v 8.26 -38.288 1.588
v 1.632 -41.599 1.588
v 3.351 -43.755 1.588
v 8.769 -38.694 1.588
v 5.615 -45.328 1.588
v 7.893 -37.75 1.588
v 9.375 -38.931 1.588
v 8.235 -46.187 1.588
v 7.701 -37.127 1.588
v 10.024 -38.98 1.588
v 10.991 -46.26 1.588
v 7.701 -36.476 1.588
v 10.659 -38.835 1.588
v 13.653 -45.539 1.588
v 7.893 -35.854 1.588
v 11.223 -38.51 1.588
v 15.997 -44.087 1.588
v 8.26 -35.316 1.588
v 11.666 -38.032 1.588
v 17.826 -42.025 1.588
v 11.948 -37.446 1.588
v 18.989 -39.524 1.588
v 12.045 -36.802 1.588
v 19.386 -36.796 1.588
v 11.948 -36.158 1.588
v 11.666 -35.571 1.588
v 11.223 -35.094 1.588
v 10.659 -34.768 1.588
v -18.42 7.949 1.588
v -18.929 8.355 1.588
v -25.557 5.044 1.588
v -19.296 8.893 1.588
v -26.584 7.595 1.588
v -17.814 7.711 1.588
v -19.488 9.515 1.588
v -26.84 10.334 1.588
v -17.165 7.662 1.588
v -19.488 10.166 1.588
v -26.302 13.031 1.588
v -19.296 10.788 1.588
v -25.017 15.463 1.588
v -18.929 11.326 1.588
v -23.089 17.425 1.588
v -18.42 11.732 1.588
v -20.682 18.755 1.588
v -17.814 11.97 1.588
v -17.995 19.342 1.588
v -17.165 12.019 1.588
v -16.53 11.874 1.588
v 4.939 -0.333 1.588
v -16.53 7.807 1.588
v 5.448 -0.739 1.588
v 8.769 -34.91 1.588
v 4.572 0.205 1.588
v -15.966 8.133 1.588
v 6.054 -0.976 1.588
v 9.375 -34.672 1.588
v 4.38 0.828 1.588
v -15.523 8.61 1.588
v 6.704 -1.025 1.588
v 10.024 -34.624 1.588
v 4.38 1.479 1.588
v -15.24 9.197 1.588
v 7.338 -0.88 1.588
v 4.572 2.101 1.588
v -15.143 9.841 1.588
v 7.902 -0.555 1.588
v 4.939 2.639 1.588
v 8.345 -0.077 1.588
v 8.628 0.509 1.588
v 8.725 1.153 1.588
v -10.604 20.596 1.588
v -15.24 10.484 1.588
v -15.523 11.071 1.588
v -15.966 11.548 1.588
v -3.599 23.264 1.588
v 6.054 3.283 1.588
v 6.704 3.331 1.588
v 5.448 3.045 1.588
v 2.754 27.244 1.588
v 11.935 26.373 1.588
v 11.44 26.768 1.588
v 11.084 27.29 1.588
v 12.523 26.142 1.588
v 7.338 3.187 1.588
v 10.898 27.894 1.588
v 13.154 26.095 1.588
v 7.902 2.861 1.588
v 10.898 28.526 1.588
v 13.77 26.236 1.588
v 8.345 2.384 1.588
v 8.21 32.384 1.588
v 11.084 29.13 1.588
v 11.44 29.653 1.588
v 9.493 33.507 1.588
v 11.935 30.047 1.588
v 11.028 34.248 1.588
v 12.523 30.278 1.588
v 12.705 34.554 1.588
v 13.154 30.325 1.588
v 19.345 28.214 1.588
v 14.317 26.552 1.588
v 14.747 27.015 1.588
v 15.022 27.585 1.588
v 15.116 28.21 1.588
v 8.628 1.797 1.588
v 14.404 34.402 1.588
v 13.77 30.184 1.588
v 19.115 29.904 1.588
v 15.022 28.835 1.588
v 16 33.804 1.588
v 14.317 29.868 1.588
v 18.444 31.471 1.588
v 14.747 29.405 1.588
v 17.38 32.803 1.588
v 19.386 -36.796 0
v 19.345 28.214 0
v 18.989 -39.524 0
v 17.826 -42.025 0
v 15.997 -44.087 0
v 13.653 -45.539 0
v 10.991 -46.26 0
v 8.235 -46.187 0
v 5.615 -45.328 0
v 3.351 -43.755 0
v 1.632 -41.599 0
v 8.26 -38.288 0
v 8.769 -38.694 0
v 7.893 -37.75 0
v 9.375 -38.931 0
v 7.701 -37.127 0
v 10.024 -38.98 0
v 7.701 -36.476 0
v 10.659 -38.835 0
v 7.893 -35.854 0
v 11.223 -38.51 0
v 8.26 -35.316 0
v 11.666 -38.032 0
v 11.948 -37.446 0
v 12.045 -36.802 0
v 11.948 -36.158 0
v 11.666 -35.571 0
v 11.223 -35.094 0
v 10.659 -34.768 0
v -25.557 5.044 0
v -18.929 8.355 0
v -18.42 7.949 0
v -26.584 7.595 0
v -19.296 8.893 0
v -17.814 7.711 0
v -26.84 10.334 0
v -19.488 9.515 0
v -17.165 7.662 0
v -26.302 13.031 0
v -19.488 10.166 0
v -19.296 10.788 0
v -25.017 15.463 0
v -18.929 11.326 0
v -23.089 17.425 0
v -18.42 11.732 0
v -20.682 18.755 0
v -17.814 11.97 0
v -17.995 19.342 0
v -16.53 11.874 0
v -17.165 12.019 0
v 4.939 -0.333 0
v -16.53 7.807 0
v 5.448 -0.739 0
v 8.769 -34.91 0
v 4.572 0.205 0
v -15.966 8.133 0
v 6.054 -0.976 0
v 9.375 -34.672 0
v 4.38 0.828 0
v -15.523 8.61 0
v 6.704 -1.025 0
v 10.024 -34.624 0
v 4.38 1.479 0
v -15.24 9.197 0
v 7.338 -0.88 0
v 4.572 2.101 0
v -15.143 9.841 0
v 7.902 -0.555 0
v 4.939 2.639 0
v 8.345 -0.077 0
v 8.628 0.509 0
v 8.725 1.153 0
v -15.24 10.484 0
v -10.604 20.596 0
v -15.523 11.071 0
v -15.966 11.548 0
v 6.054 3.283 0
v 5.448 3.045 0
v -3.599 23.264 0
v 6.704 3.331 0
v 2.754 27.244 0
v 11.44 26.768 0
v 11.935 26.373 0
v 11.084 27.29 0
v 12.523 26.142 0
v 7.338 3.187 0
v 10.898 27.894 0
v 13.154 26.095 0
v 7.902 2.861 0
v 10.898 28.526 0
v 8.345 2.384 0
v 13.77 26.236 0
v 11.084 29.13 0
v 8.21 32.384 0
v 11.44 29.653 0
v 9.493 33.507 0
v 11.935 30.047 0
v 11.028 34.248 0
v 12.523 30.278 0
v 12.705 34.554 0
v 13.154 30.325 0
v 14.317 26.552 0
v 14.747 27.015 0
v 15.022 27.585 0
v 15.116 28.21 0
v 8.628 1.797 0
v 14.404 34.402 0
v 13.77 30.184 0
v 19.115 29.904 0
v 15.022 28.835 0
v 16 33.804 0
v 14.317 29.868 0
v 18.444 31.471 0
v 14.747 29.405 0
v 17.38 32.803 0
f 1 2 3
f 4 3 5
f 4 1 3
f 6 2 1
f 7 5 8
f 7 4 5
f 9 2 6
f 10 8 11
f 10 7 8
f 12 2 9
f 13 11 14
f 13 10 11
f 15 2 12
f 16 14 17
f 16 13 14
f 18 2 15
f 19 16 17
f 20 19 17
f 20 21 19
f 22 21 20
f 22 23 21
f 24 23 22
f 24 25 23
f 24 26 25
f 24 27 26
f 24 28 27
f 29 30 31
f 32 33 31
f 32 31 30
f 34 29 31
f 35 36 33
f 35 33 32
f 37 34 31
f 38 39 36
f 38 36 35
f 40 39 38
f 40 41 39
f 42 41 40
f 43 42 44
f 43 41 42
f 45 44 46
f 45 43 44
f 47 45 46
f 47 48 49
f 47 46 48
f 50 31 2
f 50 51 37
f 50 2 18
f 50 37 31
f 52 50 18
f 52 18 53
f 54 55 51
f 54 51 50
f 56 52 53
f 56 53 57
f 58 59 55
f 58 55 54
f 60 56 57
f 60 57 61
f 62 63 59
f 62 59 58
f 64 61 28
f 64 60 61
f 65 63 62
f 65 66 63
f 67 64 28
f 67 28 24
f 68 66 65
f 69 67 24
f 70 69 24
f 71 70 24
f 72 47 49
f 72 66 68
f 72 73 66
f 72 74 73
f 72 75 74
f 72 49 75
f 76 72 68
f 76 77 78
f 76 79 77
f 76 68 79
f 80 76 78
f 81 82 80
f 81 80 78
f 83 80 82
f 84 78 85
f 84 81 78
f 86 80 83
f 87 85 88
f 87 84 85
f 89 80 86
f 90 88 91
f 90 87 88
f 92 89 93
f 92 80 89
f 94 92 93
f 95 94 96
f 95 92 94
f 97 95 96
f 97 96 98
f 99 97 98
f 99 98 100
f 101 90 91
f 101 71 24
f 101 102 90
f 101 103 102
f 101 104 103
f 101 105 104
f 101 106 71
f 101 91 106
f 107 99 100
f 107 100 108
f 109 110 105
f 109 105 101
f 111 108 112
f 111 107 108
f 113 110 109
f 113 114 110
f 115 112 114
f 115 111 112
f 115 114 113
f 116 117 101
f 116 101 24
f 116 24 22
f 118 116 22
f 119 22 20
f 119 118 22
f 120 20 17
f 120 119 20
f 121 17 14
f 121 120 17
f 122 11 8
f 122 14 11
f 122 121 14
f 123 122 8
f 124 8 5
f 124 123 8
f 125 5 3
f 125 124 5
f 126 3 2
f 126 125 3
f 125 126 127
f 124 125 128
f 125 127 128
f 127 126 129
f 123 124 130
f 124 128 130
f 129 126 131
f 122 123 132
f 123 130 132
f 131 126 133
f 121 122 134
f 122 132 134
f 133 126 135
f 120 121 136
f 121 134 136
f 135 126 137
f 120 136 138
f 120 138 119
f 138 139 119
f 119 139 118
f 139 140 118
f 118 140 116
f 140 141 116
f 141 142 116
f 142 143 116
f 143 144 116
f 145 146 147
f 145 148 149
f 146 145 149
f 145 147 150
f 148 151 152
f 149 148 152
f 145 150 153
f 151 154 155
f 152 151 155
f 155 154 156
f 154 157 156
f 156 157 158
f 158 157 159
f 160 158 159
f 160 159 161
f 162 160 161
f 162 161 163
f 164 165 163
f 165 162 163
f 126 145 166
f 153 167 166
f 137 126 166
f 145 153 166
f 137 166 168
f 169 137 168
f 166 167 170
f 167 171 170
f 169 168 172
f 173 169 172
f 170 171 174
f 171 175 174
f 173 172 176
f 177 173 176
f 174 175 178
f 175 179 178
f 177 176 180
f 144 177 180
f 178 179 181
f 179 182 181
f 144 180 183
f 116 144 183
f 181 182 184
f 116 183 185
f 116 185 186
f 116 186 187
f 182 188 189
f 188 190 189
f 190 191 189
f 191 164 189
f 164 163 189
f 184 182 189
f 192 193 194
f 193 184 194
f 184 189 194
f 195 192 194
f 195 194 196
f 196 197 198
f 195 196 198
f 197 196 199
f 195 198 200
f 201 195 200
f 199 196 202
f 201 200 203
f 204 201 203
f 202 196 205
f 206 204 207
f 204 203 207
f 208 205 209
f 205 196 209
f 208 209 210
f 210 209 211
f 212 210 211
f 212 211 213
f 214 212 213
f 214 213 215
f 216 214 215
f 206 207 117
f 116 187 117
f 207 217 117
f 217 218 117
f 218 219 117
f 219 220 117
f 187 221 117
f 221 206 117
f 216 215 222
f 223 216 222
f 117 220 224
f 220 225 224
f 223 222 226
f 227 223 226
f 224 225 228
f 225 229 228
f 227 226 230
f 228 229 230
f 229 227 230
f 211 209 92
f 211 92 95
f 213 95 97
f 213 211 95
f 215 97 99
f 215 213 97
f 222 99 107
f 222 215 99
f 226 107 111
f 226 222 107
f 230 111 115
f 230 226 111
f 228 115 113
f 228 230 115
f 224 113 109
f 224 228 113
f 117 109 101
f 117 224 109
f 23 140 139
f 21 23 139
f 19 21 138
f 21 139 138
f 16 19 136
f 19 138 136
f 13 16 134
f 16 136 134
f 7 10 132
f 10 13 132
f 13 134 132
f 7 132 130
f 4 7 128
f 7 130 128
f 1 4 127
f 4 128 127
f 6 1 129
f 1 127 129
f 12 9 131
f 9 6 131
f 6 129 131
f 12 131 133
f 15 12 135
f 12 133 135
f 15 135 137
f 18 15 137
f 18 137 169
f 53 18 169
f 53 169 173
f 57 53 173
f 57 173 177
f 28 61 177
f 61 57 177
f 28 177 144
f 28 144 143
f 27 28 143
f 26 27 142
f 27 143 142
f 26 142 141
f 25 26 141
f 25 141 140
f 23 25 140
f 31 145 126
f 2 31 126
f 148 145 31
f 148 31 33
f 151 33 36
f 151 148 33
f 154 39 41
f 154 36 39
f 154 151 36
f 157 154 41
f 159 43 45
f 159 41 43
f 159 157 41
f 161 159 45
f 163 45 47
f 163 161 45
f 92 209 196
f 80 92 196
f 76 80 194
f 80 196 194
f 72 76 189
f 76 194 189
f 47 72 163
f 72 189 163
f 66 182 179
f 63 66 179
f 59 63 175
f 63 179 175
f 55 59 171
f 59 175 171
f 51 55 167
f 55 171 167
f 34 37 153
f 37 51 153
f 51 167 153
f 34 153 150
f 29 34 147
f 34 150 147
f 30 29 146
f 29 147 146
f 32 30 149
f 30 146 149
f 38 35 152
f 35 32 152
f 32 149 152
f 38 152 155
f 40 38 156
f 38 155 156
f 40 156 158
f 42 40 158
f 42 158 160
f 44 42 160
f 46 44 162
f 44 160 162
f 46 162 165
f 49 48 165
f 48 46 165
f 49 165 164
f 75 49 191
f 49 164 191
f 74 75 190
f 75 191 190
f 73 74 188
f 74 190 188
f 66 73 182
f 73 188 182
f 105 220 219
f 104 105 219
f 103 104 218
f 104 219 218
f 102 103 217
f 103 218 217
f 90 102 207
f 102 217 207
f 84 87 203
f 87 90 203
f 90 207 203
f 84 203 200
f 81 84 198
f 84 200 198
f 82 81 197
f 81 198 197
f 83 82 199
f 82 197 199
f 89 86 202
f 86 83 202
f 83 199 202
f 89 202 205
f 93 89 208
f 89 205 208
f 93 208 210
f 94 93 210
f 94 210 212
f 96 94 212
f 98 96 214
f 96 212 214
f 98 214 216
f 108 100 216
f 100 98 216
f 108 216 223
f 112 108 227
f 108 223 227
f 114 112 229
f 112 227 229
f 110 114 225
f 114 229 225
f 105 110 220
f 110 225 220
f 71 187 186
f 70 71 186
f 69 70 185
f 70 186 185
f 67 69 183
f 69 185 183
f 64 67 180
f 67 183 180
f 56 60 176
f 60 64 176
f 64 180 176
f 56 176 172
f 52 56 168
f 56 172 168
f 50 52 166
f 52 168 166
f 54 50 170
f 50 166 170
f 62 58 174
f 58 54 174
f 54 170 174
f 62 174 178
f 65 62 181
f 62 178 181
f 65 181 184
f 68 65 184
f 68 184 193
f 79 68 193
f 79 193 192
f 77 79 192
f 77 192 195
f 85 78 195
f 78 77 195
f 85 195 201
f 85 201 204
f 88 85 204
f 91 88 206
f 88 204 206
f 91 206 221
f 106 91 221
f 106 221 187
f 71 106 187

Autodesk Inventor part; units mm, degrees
ref_plane "YZ Plane" through (0, 0, 0) normal (1, 0, 0) x (0, 1, 0)
ref_plane "XZ Plane" through (0, 0, 0) normal (0, 1, 0) x (-1, 0, 0)
ref_plane "XY Plane" through (0, 0, 0) normal (0, 0, 1) x (1, 0, 0)
sketch "main" plane through (0, 0, 0) normal (0, 0, 1) x (1, 0, 0)
  line L0 (-30.6986, 36.9894) -> (-3.5098, -9.6529)
  line L1 (14.2033, 60.1599) -> (14.2442, -4.8501)
  circle A0 centre (4.7192, -4.8561) radius 2.1844
  arc A1 (-3.5098, -9.6529) -> (14.2442, -4.8501) centre (4.7192, -4.8561) ccw
  line L2 (4.7192, -4.8561) -> (42.8192, -4.8561) construction
  circle A2 centre (1.3985, 33.099) radius 2.1844
  line L3 (4.7192, -4.8561) -> (69.8067, -4.8561) construction
  circle A3 centre (7.8533, 60.1559) radius 2.1209
  arc A4 (14.2033, 60.1599) -> (3.0678, 64.3299) centre (7.8533, 60.1559) ccw
  line L4 (1.3985, 33.099) -> (26.7985, 33.099) construction
  circle A5 centre (-22.4696, 41.7863) radius 2.1844
  arc A6 (-23.1365, 51.2879) -> (-30.6986, 36.9894) centre (-22.4696, 41.7863) ccw
  arc A7 (-23.1365, 51.2879) -> (3.0678, 64.3299) centre (-25.8203, 89.5265) ccw
  point P0 (-13.3913, 7.903)
  dimension "d33" = 19.05
  dimension "d41" = 4.3688
  dimension "d48" = 12.7
  dimension "d52" = 19.05
sketch "Sketch1" plane through (0, 0, 0) normal (0, 0, 1) x (1, 0, 0)
  line L0 (-25.5568, 5.0437) -> (1.632, -41.5986)
  line L1 (19.3451, 28.2142) -> (19.386, -36.7958)
  circle A0 centre (9.861, -36.8018) radius 2.1844
  arc A1 (1.632, -41.5986) -> (19.386, -36.7958) centre (9.861, -36.8018) ccw
  line L2 (9.861, -36.8018) -> (47.961, -36.8018) construction
  circle A2 centre (6.5404, 1.1532) radius 2.1844
  line L3 (9.861, -36.8018) -> (74.9485, -36.8018) construction
  circle A3 centre (12.9951, 28.2102) radius 2.1209
  arc A4 (19.3451, 28.2142) -> (8.2097, 32.3842) centre (12.9951, 28.2102) ccw
  line L4 (6.5404, 1.1532) -> (31.9404, 1.1532) construction
  circle A5 centre (-17.3278, 9.8406) radius 2.1844
  arc A6 (-17.9947, 19.3422) -> (-25.5568, 5.0437) centre (-17.3278, 9.8406) ccw
  arc A7 (-17.9947, 19.3422) -> (8.2097, 32.3842) centre (-20.6785, 57.5808) ccw
  point P0 (0, 0)
extrude "Extrusion1" add sketch "Sketch1" along normal blind 1.5875
properties part number "pod_gusset" material "Acetal Resin, White"
